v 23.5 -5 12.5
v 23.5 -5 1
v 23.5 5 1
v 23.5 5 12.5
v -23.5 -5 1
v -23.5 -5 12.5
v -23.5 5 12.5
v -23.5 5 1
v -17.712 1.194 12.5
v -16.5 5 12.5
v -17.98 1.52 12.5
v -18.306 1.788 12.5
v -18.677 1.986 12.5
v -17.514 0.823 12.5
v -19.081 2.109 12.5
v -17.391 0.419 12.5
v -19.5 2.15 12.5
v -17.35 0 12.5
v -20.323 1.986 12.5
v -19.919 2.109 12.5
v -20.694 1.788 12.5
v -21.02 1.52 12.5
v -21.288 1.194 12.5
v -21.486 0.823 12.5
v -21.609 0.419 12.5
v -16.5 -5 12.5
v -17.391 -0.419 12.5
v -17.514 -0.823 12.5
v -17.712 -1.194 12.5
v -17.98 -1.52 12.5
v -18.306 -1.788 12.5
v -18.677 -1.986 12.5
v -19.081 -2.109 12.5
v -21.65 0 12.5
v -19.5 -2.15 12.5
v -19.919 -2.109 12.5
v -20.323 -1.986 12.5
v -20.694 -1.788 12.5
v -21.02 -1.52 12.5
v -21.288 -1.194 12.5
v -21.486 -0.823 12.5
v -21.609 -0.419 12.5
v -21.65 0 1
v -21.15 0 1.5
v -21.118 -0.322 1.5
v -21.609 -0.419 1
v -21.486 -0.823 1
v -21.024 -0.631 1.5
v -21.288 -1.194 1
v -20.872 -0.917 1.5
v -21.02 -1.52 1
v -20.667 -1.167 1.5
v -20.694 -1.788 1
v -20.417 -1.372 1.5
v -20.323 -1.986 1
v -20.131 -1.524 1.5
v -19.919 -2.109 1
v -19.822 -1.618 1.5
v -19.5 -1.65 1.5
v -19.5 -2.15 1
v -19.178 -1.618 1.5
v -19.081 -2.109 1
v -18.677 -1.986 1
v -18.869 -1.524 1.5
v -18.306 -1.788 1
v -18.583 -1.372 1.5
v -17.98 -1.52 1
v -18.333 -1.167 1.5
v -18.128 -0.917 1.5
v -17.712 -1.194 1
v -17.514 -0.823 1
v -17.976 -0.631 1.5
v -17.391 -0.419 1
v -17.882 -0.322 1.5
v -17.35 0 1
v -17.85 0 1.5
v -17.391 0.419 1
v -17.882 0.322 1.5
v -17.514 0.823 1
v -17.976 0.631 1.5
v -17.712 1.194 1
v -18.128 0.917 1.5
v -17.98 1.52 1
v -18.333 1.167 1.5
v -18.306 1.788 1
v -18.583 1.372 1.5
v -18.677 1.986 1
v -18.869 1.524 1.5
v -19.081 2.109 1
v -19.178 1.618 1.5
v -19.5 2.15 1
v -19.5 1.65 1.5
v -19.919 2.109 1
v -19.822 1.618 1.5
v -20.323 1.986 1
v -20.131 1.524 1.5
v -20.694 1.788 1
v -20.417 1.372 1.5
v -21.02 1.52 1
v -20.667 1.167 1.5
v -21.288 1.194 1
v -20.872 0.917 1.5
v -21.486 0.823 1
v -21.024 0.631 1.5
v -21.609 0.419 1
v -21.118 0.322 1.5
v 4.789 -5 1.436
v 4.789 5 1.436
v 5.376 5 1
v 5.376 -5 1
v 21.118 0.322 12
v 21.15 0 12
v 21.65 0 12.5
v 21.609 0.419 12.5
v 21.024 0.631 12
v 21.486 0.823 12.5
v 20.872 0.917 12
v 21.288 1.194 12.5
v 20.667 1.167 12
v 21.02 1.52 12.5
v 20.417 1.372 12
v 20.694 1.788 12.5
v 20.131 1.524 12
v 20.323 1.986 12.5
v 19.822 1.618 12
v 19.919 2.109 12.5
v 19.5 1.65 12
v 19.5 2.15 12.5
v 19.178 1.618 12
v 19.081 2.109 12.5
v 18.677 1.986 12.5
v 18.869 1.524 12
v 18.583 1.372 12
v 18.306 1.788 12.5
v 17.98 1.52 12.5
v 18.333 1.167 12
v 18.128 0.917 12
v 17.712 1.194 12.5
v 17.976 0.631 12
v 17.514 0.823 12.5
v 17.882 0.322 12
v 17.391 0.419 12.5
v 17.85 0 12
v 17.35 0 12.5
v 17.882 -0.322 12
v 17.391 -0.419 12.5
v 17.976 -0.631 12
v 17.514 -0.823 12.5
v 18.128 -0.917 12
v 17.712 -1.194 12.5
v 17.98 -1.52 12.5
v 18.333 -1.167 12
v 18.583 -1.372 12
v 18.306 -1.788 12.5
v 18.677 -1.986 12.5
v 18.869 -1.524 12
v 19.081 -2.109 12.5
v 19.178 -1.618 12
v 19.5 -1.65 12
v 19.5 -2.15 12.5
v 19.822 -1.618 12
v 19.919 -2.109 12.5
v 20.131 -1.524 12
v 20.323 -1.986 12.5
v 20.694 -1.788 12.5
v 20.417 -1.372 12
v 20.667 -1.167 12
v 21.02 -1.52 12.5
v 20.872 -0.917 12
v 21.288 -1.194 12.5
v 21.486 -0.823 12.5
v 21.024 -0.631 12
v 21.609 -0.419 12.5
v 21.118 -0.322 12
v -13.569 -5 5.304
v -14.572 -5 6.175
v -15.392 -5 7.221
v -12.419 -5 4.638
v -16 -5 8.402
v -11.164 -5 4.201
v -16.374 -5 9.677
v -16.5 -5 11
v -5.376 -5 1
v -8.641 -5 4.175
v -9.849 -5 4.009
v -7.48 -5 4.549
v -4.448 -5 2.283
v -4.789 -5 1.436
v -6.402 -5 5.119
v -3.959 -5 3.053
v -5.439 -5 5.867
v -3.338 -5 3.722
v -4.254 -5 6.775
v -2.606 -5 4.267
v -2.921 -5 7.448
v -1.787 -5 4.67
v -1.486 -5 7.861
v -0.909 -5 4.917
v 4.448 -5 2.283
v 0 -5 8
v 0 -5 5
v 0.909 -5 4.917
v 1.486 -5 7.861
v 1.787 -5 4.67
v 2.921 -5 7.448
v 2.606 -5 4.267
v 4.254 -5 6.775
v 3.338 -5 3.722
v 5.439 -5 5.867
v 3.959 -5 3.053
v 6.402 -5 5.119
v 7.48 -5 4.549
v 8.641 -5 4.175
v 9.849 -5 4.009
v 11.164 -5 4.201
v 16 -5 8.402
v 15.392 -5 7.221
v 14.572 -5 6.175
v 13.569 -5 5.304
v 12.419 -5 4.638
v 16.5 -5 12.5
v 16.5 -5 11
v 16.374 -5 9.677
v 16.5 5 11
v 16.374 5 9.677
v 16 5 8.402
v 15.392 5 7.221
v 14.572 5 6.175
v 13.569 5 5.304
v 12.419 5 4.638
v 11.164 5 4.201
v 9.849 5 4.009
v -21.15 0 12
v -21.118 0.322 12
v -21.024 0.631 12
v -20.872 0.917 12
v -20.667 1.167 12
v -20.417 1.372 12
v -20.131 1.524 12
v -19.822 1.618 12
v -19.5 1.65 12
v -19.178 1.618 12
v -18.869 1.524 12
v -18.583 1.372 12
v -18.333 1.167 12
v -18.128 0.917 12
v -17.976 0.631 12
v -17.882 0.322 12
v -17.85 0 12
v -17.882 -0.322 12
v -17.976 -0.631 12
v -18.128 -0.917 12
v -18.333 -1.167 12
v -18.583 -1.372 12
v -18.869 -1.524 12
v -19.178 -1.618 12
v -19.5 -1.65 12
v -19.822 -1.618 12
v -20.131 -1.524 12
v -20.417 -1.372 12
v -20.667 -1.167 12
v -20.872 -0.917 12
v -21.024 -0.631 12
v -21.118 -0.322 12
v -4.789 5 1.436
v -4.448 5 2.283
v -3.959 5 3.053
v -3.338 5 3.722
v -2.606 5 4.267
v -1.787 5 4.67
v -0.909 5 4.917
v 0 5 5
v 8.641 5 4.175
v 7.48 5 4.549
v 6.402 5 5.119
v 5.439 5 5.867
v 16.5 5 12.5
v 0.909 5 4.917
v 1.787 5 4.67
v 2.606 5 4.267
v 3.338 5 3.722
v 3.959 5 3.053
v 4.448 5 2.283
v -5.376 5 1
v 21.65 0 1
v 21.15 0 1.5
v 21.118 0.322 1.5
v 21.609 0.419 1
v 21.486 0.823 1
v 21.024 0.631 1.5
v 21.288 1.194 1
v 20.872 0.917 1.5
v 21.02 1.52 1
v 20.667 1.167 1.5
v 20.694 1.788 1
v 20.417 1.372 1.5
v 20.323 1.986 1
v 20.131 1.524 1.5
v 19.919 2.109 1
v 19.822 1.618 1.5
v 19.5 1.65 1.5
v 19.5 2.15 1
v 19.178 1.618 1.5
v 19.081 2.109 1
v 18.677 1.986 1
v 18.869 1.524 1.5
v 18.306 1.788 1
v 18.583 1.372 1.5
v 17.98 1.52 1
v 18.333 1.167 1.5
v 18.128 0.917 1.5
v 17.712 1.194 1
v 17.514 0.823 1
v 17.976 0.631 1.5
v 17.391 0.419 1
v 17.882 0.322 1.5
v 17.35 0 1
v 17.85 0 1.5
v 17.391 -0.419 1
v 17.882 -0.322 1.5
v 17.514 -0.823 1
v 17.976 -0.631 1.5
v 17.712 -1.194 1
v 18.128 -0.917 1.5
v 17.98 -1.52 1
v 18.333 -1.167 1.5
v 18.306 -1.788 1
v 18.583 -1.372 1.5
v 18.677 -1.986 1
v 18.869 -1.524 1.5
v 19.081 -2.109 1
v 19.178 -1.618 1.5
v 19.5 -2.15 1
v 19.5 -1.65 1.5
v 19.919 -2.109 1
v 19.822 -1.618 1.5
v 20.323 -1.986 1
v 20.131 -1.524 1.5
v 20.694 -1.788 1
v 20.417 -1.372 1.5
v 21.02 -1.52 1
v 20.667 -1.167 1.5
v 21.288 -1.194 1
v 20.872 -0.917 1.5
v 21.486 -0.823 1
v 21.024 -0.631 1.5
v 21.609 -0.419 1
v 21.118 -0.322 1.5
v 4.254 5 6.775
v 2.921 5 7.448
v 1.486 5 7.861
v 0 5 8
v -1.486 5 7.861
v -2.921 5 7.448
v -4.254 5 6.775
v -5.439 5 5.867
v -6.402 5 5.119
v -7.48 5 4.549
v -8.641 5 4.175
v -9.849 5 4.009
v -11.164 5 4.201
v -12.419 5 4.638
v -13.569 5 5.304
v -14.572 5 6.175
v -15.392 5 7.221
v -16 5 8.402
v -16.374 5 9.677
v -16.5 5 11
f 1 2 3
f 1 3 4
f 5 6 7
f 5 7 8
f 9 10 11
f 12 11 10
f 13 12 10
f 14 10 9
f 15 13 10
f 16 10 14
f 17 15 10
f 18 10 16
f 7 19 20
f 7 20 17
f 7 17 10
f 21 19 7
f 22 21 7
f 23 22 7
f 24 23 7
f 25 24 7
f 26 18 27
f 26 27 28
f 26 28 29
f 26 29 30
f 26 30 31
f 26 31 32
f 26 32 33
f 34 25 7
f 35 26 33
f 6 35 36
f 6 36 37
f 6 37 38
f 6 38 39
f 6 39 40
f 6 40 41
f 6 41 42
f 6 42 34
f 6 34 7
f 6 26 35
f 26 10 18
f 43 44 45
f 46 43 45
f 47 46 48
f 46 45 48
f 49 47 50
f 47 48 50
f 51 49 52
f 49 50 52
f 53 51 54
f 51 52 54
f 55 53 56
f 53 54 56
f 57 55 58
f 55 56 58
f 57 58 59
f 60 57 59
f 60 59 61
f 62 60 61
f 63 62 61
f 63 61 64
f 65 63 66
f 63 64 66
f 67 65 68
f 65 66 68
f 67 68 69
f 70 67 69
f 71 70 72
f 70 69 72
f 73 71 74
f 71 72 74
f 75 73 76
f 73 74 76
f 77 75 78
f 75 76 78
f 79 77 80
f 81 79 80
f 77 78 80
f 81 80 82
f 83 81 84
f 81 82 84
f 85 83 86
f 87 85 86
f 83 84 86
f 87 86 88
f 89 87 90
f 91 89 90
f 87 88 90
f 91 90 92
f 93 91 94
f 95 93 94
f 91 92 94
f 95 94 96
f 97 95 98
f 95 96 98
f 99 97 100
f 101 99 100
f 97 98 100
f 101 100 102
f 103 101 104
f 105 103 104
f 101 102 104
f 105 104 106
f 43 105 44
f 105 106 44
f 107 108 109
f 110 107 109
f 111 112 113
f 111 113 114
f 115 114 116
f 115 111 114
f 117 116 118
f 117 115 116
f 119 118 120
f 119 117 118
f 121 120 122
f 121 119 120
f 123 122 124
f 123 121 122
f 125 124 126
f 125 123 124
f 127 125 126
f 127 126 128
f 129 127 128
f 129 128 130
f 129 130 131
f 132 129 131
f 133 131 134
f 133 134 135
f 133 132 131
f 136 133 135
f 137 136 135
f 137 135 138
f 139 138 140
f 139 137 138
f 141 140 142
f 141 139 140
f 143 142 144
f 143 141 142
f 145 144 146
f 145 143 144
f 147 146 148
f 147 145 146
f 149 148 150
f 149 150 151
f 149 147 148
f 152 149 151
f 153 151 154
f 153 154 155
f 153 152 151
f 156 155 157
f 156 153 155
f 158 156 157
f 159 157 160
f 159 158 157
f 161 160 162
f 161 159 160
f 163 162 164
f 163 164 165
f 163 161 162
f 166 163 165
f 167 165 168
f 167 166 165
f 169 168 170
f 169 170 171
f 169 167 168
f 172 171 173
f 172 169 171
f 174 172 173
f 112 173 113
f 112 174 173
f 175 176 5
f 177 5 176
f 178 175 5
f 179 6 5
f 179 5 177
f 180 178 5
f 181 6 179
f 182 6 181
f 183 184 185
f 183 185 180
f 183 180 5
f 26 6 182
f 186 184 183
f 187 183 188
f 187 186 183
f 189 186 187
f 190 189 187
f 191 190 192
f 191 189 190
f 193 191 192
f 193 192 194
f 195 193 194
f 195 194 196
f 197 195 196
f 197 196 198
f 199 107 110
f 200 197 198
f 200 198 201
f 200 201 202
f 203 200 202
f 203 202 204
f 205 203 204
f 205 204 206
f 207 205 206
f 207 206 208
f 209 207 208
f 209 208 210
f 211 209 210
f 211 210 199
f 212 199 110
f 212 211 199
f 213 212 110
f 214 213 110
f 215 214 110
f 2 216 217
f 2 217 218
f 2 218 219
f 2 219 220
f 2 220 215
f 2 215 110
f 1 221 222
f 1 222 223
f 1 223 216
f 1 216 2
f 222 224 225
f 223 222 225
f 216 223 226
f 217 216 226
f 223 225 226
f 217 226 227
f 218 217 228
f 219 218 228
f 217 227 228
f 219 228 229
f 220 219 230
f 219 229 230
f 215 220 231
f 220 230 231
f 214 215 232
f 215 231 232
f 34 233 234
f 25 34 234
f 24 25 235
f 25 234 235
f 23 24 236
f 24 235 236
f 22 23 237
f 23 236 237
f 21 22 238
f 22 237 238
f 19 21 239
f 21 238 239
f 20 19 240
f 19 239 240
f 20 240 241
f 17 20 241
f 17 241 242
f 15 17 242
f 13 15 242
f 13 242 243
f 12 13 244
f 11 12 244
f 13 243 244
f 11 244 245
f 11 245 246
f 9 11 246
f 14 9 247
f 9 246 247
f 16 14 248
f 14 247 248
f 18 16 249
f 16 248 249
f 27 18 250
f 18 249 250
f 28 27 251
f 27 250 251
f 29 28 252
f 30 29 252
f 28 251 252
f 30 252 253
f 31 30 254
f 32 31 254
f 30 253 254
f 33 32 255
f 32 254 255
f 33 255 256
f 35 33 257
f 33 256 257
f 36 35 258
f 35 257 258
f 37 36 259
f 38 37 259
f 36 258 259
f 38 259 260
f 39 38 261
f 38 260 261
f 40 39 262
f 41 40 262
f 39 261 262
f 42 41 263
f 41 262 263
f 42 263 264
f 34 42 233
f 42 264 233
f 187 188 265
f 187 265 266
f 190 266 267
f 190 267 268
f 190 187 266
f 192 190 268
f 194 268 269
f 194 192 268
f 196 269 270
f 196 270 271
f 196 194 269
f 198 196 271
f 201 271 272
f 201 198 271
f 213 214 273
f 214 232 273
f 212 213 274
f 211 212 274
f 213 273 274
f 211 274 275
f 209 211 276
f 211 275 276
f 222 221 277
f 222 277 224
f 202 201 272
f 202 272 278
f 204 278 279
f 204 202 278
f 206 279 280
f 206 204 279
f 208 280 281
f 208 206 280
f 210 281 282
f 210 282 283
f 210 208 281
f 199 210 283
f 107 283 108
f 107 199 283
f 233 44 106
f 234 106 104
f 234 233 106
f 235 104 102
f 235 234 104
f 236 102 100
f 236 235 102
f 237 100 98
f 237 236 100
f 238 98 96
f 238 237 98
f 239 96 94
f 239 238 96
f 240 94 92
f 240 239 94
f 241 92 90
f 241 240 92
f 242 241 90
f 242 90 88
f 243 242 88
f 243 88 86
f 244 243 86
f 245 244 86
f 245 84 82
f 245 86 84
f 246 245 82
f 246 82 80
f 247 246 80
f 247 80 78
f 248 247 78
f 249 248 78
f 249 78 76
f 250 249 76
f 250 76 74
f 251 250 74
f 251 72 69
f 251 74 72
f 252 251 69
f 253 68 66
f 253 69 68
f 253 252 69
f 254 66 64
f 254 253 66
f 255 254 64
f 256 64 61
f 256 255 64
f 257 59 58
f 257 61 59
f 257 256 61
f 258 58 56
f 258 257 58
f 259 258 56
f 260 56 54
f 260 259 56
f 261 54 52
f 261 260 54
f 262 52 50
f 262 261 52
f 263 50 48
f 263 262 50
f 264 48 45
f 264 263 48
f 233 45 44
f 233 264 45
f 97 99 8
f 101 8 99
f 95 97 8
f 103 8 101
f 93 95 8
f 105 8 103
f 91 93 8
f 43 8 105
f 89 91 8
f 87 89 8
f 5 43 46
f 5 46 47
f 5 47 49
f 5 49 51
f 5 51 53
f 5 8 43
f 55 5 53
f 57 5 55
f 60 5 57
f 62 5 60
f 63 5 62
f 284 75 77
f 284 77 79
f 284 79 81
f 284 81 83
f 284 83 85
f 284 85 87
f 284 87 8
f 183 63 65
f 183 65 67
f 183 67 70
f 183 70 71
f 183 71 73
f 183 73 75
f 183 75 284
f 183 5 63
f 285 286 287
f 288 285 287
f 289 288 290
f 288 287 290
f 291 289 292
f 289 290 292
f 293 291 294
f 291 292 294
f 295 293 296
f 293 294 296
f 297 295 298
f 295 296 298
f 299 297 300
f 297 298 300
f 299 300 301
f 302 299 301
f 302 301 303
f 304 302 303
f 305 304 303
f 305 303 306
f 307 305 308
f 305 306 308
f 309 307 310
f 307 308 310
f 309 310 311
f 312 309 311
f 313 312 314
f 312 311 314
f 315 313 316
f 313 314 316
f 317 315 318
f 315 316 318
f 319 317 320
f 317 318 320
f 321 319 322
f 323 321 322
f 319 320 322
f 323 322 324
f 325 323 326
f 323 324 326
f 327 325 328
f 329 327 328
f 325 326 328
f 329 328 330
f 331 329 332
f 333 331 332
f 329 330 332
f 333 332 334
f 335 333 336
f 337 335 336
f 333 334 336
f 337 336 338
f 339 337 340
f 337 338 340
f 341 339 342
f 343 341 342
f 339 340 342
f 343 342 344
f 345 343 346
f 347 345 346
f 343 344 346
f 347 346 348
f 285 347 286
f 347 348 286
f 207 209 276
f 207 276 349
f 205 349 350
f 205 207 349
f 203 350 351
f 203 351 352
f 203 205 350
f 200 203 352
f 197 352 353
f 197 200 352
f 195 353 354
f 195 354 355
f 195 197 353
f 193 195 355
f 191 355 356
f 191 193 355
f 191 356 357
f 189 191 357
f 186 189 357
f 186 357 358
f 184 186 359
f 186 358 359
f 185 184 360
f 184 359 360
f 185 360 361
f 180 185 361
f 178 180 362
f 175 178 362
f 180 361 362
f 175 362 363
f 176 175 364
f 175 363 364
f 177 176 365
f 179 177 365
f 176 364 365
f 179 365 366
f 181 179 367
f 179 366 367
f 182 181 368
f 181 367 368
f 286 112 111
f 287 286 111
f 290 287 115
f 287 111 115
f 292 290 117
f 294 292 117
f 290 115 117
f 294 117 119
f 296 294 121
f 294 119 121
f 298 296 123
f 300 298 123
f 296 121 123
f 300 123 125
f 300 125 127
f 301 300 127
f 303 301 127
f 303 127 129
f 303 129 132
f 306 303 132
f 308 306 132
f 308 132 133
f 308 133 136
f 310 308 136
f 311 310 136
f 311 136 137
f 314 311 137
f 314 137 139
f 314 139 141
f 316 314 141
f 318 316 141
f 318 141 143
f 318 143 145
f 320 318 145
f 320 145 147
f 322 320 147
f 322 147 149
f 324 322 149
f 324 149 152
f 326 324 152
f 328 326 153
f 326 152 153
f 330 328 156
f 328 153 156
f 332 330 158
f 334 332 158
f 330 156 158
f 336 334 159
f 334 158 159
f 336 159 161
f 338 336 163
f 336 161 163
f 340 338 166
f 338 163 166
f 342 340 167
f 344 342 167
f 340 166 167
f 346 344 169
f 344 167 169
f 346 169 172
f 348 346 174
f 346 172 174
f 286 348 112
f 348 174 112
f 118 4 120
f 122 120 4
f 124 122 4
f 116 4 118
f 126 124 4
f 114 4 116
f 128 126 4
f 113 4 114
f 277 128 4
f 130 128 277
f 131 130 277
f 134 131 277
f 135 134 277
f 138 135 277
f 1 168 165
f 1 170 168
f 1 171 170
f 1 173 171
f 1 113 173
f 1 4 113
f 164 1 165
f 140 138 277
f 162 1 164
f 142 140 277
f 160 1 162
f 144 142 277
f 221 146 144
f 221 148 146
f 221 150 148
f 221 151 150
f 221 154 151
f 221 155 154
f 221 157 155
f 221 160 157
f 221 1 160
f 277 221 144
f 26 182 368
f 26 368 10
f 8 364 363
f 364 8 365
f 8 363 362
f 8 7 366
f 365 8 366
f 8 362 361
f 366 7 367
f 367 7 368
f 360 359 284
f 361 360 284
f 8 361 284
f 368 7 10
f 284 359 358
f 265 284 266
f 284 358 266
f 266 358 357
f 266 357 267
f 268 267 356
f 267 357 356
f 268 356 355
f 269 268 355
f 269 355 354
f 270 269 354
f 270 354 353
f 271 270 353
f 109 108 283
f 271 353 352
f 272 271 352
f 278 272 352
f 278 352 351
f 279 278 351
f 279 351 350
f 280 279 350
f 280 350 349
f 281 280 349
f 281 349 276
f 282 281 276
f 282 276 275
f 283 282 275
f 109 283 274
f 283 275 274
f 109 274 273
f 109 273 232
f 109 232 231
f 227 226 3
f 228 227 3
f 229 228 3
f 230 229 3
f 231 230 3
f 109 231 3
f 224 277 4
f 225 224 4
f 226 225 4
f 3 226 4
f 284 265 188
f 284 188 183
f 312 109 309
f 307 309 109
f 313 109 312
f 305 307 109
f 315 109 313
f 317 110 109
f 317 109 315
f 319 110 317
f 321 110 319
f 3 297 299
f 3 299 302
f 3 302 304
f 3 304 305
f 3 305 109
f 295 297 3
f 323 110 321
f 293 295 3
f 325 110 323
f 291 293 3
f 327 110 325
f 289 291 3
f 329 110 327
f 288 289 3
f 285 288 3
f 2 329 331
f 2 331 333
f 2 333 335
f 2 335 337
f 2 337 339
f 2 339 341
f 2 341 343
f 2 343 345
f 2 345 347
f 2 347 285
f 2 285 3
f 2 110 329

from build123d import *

# Parameters (mm, degrees)
F1_DEPTH    = 5
F2_T1_DEPTH = 5
F2_T3_DEPTH = 5
F3_T1_DEPTH = 6.2324692544
F3_T3_DEPTH = 6.2324692544
F4_R        = 1.65
F5_DEPTH    = 11.501
F6_SIZE     = 0.5


# Not quite as in the source:
# - a fillet or chamfer that OpenCascade refuses, or shapes differently, is made with other operations: its cross-section is extruded or revolved along the edge and cut away or added
# - a pattern or mirror of a feature is missing from the dataset's text; its kind, count and spacing are read off the source's solid


with BuildPart() as f1:
    # F0 (on Front) → F1 (new body, symmetric)
    with BuildSketch(Plane.XZ):
        with BuildLine():
            Line((4.8989794856, 1), (23.5, 1))
            Line((23.5, 1), (23.5, 12.5))
            Line((23.5, 12.5), (16.5, 12.5))
            Line((16.5, 12.5), (16.5, 4))
            Line((16.5, 4), (6.9282032303, 4))
            ThreePointArc((6.9282032303, 4), (4, 6.9282032303), (0, 8))
            ThreePointArc((0, 8), (-4, 6.9282032303), (-6.9282032303, 4))
            Line((-6.9282032303, 4), (-16.5, 4))
            Line((-16.5, 4), (-16.5, 12.5))
            Line((-16.5, 12.5), (-23.5, 12.5))
            Line((-23.5, 12.5), (-23.5, 1))
            Line((-23.5, 1), (-4.8989794856, 1))
            ThreePointArc((-4.8989794856, 1), (-3.1622776602, 3.8729833462), (0, 5))
            ThreePointArc((0, 5), (3.1622776602, 3.8729833462), (4.8989794856, 1))
        make_face()
    extrude(amount=F1_DEPTH, both=True)

    # F2: fillet of radius 7 on 8 edges, made by hand

    # F2_s2 → F2_t1 (join)
    with BuildSketch(Plane.XZ.offset(-5)):
        with BuildLine():
            ThreePointArc((16.5, 11), (14.4497474683, 6.0502525317), (9.5, 4))
            Line((9.5, 4), (16.5, 4))
            Line((16.5, 4), (16.5, 11))
        make_face()
        with BuildLine():
            ThreePointArc((10.1980390272, 4), (7.6420004255, 4.4833546462), (5.4389541478, 5.8666666667))
            ThreePointArc((5.4389541478, 5.8666666667), (6.2536194731, 4.989212712), (6.9282032303, 4))
            Line((6.9282032303, 4), (10.1980390272, 4))
        make_face()
        with BuildLine():
            ThreePointArc((-5.4389541478, 5.8666666667), (-7.6420004255, 4.4833546462), (-10.1980390272, 4))
            Line((-10.1980390272, 4), (-6.9282032303, 4))
            ThreePointArc((-6.9282032303, 4), (-6.2536194731, 4.989212712), (-5.4389541478, 5.8666666667))
        make_face()
        with BuildLine():
            ThreePointArc((-9.5, 4), (-14.4497474683, 6.0502525317), (-16.5, 11))
            Line((-16.5, 11), (-16.5, 4))
            Line((-16.5, 4), (-9.5, 4))
        make_face()
    extrude(amount=F2_T1_DEPTH)

    # F2_s4 → F2_t3 (join)
    with BuildSketch(Plane.XZ):
        with BuildLine():
            ThreePointArc((16.5, 11), (14.4497474683, 6.0502525317), (9.5, 4))
            Line((9.5, 4), (16.5, 4))
            Line((16.5, 4), (16.5, 11))
        make_face()
        with BuildLine():
            ThreePointArc((10.1980390272, 4), (7.6420004255, 4.4833546462), (5.4389541478, 5.8666666667))
            ThreePointArc((5.4389541478, 5.8666666667), (6.2536194731, 4.989212712), (6.9282032303, 4))
            Line((6.9282032303, 4), (10.1980390272, 4))
        make_face()
        with BuildLine():
            ThreePointArc((-5.4389541478, 5.8666666667), (-7.6420004255, 4.4833546462), (-10.1980390272, 4))
            Line((-10.1980390272, 4), (-6.9282032303, 4))
            ThreePointArc((-6.9282032303, 4), (-6.2536194731, 4.989212712), (-5.4389541478, 5.8666666667))
        make_face()
        with BuildLine():
            ThreePointArc((-9.5, 4), (-14.4497474683, 6.0502525317), (-16.5, 11))
            Line((-16.5, 11), (-16.5, 4))
            Line((-16.5, 4), (-9.5, 4))
        make_face()
    extrude(amount=F2_T3_DEPTH)

    # F3: chamfer of 0.5 on 4 edges, made by hand

    # F3_s2 → F3_t1 (cut)
    with BuildSketch(Plane.XZ.offset(-6.2324692544)):
        with BuildLine():
            Line((-4.7731743681, 1.4483837223), (-5.3918225964, 0.9880608955))
            Line((-5.3918225964, 0.9880608955), (-5.3918225964, 0.9780608955))
            ThreePointArc((-5.3918225964, 0.9780608955), (-5.145401041, 0.99), (-4.8989794856, 0.99))
            Line((-4.8989794856, 0.99), (-4.8891815266, 0.998))
            ThreePointArc((-4.8891815266, 0.998), (-4.8374189809, 1.2245315852), (-4.7635959284, 1.445510833))
            Line((-4.7635959284, 1.445510833), (-4.7731743681, 1.4483837223))
        make_face()
        with BuildLine():
            Line((4.7731743681, 1.4483837223), (5.3918225964, 0.9880608955))
            Line((5.3918225964, 0.9880608955), (5.3918225964, 0.9780608955))
            ThreePointArc((5.3918225964, 0.9780608955), (5.145401041, 0.99), (4.8989794856, 0.99))
            Line((4.8989794856, 0.99), (4.8891815266, 0.998))
            ThreePointArc((4.8891815266, 0.998), (4.8374189809, 1.2245315852), (4.7635959284, 1.445510833))
            Line((4.7635959284, 1.445510833), (4.7731743681, 1.4483837223))
        make_face()
    extrude(amount=F3_T1_DEPTH, mode=Mode.SUBTRACT)

    # F3_s4 → F3_t3 (cut)
    with BuildSketch(Plane.XZ):
        with BuildLine():
            Line((-4.7731743681, 1.4483837223), (-5.3918225964, 0.9880608955))
            Line((-5.3918225964, 0.9880608955), (-5.3918225964, 0.9780608955))
            ThreePointArc((-5.3918225964, 0.9780608955), (-5.145401041, 0.99), (-4.8989794856, 0.99))
            Line((-4.8989794856, 0.99), (-4.8891815266, 0.998))
            ThreePointArc((-4.8891815266, 0.998), (-4.8374189809, 1.2245315852), (-4.7635959284, 1.445510833))
            Line((-4.7635959284, 1.445510833), (-4.7731743681, 1.4483837223))
        make_face()
        with BuildLine():
            Line((4.7731743681, 1.4483837223), (5.3918225964, 0.9880608955))
            Line((5.3918225964, 0.9880608955), (5.3918225964, 0.9780608955))
            ThreePointArc((5.3918225964, 0.9780608955), (5.145401041, 0.99), (4.8989794856, 0.99))
            Line((4.8989794856, 0.99), (4.8891815266, 0.998))
            ThreePointArc((4.8891815266, 0.998), (4.8374189809, 1.2245315852), (4.7635959284, 1.445510833))
            Line((4.7635959284, 1.445510833), (4.7731743681, 1.4483837223))
        make_face()
    extrude(amount=F3_T3_DEPTH, mode=Mode.SUBTRACT)

    # F4 (on face) → F5 (cut, through all)
    with BuildSketch(Plane.XY.offset(12.5)):
        with Locations((19.5, 0)):
            Circle(F4_R)
    f5 = extrude(amount=-F5_DEPTH, mode=Mode.SUBTRACT)

    # F5_copies: F5 across plane
    add(f5.mirror(Plane(origin=(0, 0, 0), x_dir=(0, 0, -1), z_dir=(-1, 0, 0))), mode=Mode.SUBTRACT)

    # F6
    f6_edges = [f1.edges().sort_by_distance(p)[0] for p in [
        (19.5, 1.65, 12.5),
        (19.5, -1.65, 12.5),
        (19.5, 1.65, 1),
        (-19.5, 1.65, 1),
        (-19.5, 1.65, 12.5),
        (19.5, -1.65, 1),
        (-19.5, -1.65, 1),
        (-19.5, -1.65, 12.5),
    ]]
    chamfer(f6_edges, length=F6_SIZE)


solid = f1.part
